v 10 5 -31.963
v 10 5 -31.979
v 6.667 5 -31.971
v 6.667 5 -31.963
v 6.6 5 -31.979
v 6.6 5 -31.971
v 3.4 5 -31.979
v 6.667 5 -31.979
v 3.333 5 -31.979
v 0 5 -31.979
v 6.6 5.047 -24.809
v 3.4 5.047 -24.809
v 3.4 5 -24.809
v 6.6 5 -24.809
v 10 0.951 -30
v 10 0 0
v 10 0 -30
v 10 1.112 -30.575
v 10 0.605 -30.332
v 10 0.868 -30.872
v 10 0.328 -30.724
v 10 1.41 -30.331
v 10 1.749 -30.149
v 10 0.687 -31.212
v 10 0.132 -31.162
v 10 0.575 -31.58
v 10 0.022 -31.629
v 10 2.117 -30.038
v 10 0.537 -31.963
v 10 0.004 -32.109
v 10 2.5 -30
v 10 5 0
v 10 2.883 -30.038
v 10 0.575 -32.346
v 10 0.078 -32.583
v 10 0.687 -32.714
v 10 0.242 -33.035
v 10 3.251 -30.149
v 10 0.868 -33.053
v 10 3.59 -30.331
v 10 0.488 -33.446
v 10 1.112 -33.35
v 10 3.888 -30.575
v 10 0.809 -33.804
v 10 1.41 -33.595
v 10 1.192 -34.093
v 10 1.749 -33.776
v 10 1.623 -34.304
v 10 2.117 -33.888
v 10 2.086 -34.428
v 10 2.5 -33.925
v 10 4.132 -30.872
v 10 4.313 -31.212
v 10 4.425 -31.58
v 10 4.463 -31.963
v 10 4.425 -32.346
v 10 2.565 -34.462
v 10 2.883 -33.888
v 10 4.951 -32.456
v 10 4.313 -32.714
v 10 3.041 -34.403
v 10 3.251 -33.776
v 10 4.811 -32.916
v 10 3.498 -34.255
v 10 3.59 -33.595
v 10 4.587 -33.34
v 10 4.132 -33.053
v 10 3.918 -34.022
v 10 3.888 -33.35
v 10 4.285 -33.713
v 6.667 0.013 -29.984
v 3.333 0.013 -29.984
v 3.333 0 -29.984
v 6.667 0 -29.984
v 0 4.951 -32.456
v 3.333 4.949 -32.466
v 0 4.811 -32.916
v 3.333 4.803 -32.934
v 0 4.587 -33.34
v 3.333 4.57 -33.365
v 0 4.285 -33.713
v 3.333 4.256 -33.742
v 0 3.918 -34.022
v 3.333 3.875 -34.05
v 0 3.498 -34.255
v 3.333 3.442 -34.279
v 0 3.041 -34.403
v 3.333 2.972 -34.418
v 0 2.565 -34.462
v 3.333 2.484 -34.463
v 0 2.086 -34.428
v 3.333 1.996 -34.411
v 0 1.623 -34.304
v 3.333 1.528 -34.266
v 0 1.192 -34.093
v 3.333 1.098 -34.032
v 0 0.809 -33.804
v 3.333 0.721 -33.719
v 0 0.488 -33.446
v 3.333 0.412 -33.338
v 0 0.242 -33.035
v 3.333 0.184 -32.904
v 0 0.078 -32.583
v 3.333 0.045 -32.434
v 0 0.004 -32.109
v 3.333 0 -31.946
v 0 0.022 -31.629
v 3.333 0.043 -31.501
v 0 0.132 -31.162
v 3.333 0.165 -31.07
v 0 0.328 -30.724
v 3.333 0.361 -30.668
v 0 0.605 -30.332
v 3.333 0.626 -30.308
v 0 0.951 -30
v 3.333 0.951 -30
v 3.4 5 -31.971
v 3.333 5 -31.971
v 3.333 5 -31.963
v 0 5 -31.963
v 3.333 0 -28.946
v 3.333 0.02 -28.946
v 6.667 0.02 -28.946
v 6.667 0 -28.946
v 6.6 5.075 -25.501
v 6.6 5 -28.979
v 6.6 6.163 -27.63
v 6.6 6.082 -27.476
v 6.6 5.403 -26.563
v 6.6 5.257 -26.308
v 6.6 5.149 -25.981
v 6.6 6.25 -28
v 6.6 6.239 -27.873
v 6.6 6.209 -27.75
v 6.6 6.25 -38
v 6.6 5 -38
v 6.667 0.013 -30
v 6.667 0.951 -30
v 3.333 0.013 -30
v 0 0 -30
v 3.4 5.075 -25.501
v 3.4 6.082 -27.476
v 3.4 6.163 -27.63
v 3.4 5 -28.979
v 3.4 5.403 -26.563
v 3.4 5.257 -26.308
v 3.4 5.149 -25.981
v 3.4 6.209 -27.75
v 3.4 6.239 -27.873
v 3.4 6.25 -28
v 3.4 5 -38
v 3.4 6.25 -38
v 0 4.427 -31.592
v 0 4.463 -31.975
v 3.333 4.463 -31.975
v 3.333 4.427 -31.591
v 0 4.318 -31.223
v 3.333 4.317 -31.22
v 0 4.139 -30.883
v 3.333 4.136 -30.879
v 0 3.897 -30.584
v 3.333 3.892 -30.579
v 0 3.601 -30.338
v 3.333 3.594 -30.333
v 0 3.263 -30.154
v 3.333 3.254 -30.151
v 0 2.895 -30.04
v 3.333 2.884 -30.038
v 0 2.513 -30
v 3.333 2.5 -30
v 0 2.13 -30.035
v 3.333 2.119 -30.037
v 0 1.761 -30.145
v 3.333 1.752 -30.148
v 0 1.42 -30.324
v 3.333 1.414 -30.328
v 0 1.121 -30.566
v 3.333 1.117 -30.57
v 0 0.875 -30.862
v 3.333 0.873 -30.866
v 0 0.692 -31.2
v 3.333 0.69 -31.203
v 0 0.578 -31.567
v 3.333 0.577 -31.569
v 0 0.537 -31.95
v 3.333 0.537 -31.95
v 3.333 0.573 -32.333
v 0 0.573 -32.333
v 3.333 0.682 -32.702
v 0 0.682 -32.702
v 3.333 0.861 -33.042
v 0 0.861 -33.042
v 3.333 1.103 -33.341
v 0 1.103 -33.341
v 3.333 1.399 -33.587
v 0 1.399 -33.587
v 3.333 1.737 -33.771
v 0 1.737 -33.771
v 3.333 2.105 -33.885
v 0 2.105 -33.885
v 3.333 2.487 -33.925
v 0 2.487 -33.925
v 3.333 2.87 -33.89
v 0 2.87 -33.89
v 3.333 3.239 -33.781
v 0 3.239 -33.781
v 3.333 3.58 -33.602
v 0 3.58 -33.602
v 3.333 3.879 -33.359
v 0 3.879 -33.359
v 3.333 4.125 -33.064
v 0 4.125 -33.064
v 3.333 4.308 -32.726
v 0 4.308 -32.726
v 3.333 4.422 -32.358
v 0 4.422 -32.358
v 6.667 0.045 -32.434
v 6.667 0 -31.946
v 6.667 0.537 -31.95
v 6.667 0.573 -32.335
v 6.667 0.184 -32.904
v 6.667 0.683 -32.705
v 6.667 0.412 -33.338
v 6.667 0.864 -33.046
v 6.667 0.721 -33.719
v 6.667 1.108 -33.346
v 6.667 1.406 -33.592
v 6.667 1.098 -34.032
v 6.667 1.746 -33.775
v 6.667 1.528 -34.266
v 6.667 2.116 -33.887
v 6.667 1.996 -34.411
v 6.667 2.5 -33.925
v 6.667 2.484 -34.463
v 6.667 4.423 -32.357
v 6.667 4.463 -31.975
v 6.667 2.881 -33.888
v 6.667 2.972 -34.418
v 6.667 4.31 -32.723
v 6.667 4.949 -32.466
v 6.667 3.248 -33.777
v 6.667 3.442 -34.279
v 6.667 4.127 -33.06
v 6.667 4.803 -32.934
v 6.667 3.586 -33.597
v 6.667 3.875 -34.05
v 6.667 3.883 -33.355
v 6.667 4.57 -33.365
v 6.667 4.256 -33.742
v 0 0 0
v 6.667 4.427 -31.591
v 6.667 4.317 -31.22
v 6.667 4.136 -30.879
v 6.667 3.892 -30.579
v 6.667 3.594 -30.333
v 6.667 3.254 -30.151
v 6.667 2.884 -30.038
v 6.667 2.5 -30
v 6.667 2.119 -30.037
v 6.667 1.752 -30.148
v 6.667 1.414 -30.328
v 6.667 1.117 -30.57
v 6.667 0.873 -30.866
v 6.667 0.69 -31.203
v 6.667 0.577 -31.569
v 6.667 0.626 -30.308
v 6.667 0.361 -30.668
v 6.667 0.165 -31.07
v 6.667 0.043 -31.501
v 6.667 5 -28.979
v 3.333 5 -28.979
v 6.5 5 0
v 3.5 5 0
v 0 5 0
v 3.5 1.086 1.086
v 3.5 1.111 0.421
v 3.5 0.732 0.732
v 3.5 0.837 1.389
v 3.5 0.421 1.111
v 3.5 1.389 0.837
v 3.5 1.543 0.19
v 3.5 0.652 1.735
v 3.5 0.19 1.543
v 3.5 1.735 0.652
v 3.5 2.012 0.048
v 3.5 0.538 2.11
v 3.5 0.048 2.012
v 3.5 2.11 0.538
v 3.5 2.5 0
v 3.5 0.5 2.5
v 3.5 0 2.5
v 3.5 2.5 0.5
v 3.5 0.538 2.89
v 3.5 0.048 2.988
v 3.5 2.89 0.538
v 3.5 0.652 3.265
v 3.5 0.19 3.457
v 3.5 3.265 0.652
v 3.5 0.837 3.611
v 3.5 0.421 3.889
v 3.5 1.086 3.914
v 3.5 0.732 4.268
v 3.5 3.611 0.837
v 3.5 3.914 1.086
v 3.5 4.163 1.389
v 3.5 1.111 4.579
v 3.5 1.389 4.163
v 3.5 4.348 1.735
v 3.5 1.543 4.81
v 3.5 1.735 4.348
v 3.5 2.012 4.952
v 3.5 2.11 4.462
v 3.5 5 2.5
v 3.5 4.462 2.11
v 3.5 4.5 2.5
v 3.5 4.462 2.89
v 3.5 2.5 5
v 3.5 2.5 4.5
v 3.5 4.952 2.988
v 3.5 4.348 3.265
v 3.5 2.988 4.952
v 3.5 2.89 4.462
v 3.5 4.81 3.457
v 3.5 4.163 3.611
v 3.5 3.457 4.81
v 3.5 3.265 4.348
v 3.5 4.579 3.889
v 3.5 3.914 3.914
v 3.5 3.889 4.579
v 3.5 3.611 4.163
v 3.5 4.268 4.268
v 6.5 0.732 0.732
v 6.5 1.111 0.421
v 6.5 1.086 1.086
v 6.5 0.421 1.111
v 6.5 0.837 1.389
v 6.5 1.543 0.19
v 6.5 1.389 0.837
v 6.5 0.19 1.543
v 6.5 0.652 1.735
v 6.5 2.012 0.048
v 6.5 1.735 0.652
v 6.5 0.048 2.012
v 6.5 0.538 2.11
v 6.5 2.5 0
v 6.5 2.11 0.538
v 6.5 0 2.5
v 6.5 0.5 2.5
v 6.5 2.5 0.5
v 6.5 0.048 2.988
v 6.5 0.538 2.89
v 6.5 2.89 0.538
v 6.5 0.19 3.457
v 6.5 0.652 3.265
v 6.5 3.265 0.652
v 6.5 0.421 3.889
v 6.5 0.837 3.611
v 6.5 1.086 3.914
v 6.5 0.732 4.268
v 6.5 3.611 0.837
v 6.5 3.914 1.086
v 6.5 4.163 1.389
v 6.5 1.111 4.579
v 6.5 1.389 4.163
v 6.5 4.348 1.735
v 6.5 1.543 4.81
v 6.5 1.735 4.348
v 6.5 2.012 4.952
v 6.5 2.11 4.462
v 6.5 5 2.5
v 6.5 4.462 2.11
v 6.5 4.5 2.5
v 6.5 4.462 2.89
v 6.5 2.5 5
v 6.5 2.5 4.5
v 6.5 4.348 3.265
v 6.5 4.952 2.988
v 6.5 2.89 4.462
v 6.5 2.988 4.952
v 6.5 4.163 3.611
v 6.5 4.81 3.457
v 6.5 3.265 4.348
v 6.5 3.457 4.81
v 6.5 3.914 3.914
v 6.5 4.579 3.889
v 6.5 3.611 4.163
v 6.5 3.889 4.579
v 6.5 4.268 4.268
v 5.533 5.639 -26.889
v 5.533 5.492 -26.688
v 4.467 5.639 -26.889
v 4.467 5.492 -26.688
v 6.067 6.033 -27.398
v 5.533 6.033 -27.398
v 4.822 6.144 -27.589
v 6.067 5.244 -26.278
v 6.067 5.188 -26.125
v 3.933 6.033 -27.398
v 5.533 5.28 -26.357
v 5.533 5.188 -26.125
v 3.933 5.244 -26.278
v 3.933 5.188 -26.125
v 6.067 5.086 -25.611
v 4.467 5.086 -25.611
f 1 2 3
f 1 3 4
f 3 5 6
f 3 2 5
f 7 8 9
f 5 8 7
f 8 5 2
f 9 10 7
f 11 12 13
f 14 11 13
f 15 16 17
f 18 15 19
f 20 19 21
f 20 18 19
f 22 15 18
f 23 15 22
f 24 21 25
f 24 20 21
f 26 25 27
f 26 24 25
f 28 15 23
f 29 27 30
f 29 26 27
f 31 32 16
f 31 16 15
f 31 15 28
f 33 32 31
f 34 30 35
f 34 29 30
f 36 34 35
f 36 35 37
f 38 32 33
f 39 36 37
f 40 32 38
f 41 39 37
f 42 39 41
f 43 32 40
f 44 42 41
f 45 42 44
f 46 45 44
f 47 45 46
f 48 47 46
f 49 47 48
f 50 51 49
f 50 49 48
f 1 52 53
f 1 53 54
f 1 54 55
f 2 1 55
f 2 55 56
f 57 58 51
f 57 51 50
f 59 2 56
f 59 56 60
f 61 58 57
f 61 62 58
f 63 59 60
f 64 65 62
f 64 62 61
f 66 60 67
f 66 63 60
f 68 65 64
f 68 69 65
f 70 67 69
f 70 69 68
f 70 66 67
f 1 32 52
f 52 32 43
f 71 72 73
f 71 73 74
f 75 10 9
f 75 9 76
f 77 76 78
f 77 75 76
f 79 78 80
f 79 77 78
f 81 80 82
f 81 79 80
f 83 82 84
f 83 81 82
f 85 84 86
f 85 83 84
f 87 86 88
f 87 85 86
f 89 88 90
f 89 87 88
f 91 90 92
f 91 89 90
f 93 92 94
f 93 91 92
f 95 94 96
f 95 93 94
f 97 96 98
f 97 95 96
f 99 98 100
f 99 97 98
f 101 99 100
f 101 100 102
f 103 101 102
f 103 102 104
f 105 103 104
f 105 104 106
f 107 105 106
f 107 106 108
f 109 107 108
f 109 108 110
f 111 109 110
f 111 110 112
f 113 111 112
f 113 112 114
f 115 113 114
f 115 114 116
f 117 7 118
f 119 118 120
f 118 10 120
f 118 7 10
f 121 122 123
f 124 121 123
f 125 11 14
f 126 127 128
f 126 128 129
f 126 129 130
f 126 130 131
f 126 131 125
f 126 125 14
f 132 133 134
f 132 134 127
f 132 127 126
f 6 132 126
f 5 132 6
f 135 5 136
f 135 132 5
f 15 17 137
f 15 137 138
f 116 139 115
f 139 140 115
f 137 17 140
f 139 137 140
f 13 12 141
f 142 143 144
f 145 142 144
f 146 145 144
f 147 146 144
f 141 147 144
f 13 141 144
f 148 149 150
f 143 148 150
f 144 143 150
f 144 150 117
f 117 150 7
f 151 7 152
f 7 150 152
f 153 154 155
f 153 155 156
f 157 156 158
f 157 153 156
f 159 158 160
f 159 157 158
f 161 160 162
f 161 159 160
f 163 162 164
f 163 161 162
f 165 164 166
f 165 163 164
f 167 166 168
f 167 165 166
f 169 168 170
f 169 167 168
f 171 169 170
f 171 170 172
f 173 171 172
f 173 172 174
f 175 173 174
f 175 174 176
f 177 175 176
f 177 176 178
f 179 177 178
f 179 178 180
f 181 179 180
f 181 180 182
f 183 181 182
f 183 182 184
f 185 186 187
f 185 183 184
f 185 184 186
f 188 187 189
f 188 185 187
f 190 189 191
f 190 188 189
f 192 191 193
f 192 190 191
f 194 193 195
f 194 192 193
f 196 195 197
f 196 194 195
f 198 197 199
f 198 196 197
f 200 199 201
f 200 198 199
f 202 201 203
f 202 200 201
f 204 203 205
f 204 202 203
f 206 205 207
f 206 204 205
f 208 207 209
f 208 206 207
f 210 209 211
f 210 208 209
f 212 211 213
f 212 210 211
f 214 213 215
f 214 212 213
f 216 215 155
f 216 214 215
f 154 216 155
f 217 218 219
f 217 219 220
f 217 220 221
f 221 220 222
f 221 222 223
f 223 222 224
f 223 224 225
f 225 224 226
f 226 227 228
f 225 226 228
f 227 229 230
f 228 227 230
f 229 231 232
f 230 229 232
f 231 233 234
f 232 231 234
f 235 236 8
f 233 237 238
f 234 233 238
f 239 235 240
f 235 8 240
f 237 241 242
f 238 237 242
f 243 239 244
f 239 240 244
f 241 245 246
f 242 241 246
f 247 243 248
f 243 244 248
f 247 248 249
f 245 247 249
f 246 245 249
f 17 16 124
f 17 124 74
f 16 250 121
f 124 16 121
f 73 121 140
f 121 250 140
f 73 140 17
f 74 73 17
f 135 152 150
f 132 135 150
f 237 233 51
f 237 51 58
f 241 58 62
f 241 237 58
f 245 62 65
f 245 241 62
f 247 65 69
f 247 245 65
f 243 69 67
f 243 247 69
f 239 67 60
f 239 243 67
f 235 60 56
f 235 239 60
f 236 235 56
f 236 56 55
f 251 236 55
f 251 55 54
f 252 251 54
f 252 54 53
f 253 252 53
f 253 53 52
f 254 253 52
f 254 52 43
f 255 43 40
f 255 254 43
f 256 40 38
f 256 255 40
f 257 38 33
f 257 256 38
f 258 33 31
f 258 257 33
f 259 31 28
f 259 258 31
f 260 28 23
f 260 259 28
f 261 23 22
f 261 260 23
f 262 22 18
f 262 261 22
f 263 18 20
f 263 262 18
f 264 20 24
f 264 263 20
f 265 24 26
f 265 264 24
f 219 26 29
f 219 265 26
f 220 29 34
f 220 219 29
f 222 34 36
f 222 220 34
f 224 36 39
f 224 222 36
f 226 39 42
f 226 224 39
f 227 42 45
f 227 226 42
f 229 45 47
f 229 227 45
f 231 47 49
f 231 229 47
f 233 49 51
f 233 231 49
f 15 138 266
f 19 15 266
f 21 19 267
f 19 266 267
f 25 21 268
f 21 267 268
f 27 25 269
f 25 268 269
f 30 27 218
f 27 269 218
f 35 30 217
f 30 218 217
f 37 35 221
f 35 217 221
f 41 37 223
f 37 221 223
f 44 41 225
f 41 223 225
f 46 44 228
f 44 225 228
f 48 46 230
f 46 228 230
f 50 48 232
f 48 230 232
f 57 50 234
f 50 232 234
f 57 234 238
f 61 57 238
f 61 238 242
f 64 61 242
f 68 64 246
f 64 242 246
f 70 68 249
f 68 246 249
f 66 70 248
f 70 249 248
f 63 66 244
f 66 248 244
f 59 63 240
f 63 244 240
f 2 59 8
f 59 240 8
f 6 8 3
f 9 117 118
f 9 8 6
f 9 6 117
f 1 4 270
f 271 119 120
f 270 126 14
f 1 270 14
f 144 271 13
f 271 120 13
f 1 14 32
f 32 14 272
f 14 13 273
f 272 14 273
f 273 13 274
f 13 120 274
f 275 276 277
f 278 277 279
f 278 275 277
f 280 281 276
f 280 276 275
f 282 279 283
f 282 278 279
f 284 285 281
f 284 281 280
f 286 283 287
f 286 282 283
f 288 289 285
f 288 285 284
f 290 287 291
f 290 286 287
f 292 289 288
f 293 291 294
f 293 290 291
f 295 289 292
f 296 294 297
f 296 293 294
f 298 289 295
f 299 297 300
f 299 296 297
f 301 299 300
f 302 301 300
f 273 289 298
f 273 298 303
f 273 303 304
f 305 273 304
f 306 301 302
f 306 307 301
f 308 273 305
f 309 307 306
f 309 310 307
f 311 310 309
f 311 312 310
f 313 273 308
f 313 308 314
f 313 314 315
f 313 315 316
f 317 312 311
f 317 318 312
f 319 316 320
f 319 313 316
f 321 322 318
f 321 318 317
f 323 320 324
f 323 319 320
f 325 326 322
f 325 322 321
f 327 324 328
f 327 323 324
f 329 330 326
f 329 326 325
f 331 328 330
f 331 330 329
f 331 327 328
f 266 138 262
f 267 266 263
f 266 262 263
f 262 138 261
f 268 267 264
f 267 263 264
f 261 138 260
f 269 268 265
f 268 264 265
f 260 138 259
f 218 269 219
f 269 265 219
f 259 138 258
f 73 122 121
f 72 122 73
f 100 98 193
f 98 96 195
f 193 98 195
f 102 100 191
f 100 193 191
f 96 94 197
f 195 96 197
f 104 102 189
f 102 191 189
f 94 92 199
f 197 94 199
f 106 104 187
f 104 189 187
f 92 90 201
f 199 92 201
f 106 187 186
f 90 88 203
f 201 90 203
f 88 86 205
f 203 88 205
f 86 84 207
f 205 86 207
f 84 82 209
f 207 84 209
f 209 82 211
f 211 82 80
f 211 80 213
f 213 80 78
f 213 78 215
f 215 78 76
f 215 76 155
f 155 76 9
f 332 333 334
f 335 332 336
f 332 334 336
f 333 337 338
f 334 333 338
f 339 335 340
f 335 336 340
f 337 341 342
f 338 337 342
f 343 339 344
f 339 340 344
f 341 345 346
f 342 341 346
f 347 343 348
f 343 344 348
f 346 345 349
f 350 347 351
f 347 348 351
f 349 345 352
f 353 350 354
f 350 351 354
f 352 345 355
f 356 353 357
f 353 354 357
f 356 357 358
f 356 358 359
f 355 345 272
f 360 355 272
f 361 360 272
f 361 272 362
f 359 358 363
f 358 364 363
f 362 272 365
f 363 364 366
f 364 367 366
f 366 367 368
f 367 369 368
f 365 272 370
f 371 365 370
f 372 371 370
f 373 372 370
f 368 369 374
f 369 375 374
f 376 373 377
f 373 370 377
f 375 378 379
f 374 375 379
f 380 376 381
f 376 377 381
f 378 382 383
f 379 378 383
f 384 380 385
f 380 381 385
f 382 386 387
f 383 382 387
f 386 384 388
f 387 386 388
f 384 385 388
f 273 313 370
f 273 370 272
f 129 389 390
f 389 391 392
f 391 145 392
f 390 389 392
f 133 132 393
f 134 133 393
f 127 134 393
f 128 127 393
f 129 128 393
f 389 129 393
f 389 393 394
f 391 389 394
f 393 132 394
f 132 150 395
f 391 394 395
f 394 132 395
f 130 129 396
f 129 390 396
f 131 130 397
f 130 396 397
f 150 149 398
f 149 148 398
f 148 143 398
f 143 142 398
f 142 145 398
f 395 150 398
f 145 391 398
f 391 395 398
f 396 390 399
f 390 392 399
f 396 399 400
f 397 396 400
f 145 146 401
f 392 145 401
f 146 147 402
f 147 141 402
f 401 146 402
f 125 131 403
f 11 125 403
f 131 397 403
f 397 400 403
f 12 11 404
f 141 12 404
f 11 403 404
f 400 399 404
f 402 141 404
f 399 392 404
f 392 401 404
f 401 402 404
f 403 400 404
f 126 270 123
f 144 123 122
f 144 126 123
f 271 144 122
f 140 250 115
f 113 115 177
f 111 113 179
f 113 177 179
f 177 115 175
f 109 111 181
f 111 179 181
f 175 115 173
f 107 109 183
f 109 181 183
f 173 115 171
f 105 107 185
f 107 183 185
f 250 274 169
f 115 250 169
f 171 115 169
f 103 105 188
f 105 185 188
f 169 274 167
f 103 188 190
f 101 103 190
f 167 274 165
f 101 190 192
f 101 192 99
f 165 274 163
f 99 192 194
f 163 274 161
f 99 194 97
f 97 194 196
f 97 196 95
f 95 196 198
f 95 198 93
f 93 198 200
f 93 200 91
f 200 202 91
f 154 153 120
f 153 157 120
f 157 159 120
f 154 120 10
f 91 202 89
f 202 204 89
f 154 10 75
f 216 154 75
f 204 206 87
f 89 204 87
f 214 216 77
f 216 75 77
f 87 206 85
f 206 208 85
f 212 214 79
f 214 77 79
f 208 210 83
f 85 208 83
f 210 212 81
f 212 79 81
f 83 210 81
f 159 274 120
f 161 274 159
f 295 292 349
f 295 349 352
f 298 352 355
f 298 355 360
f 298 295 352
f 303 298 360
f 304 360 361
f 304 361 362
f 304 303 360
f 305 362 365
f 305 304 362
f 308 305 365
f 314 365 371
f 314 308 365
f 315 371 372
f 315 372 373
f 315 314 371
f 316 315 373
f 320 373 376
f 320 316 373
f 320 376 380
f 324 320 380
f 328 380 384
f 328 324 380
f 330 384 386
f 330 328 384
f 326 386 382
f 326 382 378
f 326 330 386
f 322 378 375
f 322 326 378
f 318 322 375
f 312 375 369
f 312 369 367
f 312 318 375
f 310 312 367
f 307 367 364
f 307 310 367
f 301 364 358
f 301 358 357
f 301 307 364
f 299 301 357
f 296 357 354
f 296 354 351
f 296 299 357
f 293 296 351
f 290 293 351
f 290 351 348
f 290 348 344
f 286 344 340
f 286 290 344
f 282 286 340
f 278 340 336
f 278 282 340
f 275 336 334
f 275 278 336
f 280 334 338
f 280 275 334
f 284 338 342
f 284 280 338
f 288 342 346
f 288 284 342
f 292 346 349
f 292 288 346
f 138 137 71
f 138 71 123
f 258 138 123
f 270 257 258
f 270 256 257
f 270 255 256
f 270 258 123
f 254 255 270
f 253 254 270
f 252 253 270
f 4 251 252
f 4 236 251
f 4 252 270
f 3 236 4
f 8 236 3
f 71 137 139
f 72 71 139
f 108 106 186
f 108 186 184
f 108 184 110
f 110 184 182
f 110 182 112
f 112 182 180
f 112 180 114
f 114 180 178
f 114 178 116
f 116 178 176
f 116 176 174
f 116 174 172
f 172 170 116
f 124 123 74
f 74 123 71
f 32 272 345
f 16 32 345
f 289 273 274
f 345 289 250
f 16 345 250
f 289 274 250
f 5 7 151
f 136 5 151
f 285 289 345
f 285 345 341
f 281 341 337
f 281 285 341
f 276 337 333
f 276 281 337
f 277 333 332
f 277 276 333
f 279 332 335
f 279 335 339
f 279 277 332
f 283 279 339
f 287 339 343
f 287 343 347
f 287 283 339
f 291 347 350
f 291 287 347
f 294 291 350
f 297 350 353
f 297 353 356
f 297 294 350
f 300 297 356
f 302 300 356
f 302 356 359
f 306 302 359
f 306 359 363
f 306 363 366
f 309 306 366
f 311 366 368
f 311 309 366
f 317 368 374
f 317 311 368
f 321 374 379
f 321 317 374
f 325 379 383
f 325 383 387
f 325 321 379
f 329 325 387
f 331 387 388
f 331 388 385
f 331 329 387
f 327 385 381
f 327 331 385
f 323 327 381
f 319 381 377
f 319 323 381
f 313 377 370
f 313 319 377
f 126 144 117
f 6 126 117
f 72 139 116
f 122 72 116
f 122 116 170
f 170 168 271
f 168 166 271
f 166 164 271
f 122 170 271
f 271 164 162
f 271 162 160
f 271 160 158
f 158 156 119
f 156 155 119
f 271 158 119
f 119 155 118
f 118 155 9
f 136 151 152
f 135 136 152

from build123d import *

# Parameters (mm, degrees)
BOSS_EXTRUDE1_DEPTH      = 10
SKETCH4_R                = 1.962636903
CUT_EXTRUDE2_DEPTH       = 10
SKETCH6_R                = 2.5
SKETCH6_R_2              = 1.962636903
BOSS_EXTRUDE2_DEPTH      = 3.333333333
BOSS_EXTRUDE3_START      = -3.333333333
SKETCH7_R                = 2.5
SKETCH7_R_2              = 1.962636903
BOSS_EXTRUDE3_DEPTH      = 3.333333333
SKETCH9_W                = 3.333333334
SKETCH9_H                = 5
CUT_EXTRUDE7_DEPTH       = 3
SKETCH10_W               = 3.333333334
SKETCH10_H               = 1.037363097
CUT_EXTRUDE8_DEPTH       = 37.201372358
BOSS_EXTRUDE4_DEPTH      = 1.5
BOSS_EXTRUDE4_DEPTH_BACK = 1.5
SKETCH12_R               = 2
BOSS_EXTRUDE9_DEPTH      = 1.6
BOSS_EXTRUDE9_DEPTH_BACK = 1.6


with BuildPart() as part:
    # Sketch3 → Boss-Extrude1 (new body)
    with BuildSketch(Plane(origin=(0, 0, 0), x_dir=(0, 0, -1), z_dir=(1, 0, 0))):
        Polygon((0, 5), (0, 0), (30, 0), (30, 2.5), (31.962636903, 2.5), (31.97894003, 5), (30, 5), align=None)
    extrude(amount=BOSS_EXTRUDE1_DEPTH)

    # Sketch4 → Cut-Extrude2 (cut)
    with BuildSketch(Plane(origin=(0, 0, 0), x_dir=(0, 0, -1), z_dir=(1, 0, 0))):
        with Locations((31.962636903, 2.5)):
            Circle(SKETCH4_R)
    extrude(amount=CUT_EXTRUDE2_DEPTH, mode=Mode.SUBTRACT)

    # Sketch6 → Boss-Extrude2 (add)
    with BuildSketch(Plane.ZY):
        with Locations((-31.962636903, 2.5)):
            Circle(SKETCH6_R)
        with Locations((-31.962636903, 2.5)):
            Circle(SKETCH6_R_2, mode=Mode.SUBTRACT)
    extrude(amount=-BOSS_EXTRUDE2_DEPTH)

    # Sketch7 → Boss-Extrude3 (add)
    with BuildSketch(Plane(origin=(10, 0, 0), x_dir=(0, 0, -1), z_dir=(1, 0, 0)).offset(BOSS_EXTRUDE3_START)):
        with Locations((31.962636903, 2.5)):
            Circle(SKETCH7_R)
        with Locations((31.962636903, 2.5)):
            Circle(SKETCH7_R_2, mode=Mode.SUBTRACT)
    extrude(amount=BOSS_EXTRUDE3_DEPTH)

    # Sketch9 → Cut-Extrude7 (cut)
    with BuildSketch(Plane(origin=(0, -0.208321197, -31.944975261), x_dir=(-1, 0, 0), z_dir=(0, -0.006521112201233067, -0.9999787373217788))):
        with Locations((-5, 2.708378785)):
            Rectangle(SKETCH9_W, SKETCH9_H)
    extrude(amount=-CUT_EXTRUDE7_DEPTH, mode=Mode.SUBTRACT)

    # Sketch10 → Cut-Extrude8 (cut, through all)
    with BuildSketch(Plane(origin=(0, 0.208374354, -0.001358861), x_dir=(1, 0, 0), z_dir=(0, 0.9999787373217788, -0.00652111220123307))):
        with Locations((5, 29.464336059)):
            Rectangle(SKETCH10_W, SKETCH10_H)
    extrude(amount=-CUT_EXTRUDE8_DEPTH, mode=Mode.SUBTRACT)

    # Sketch12 → Boss-Extrude4 (add, two sides: drawn at the far end of the back side and taken through both)
    with BuildSketch(Plane(origin=(5, 0, 0), x_dir=(0, 0, -1), z_dir=(1, 0, 0)).offset(-BOSS_EXTRUDE4_DEPTH_BACK)):
        with BuildLine():
            Line((-2.5, 5), (0, 5))
            Line((0, 5), (0, 2.5))
            ThreePointArc((0, 2.5), (-4.267766953, 0.732233047), (-2.5, 5))
        make_face()
        with Locations((-2.5, 2.5)):
            Circle(SKETCH12_R, mode=Mode.SUBTRACT)
    extrude(amount=BOSS_EXTRUDE4_DEPTH + BOSS_EXTRUDE4_DEPTH_BACK)

    # Sketch13 → Boss-Extrude9 (add, two sides: drawn at the far end of the back side and taken through both)
    with BuildSketch(Plane(origin=(5, 0, 0), x_dir=(0, 0, -1), z_dir=(1, 0, 0)).offset(-BOSS_EXTRUDE9_DEPTH_BACK)):
        with BuildLine():
            Line((24.809137755, 5), (28, 5))
            Line((28, 5), (38, 5))
            Line((38, 5), (38, 6.25))
            Line((38, 6.25), (28, 6.25))
            add(Edge.make_bspline(
                [(28, 6.25), (27.570139782, 6.25), (27.108034748, 5.787413316), (26.444737385, 5.323894947), (26.11400028, 5.04700236), (24.809137755, 5.04700236)],
                knots=[0, 0, 0, 0, 0.435997525, 0.535997525, 1, 1, 1, 1], degree=3))
            Line((24.809137755, 5.04700236), (24.809137755, 5))
        make_face()
    extrude(amount=BOSS_EXTRUDE9_DEPTH + BOSS_EXTRUDE9_DEPTH_BACK)


solid = part.part
